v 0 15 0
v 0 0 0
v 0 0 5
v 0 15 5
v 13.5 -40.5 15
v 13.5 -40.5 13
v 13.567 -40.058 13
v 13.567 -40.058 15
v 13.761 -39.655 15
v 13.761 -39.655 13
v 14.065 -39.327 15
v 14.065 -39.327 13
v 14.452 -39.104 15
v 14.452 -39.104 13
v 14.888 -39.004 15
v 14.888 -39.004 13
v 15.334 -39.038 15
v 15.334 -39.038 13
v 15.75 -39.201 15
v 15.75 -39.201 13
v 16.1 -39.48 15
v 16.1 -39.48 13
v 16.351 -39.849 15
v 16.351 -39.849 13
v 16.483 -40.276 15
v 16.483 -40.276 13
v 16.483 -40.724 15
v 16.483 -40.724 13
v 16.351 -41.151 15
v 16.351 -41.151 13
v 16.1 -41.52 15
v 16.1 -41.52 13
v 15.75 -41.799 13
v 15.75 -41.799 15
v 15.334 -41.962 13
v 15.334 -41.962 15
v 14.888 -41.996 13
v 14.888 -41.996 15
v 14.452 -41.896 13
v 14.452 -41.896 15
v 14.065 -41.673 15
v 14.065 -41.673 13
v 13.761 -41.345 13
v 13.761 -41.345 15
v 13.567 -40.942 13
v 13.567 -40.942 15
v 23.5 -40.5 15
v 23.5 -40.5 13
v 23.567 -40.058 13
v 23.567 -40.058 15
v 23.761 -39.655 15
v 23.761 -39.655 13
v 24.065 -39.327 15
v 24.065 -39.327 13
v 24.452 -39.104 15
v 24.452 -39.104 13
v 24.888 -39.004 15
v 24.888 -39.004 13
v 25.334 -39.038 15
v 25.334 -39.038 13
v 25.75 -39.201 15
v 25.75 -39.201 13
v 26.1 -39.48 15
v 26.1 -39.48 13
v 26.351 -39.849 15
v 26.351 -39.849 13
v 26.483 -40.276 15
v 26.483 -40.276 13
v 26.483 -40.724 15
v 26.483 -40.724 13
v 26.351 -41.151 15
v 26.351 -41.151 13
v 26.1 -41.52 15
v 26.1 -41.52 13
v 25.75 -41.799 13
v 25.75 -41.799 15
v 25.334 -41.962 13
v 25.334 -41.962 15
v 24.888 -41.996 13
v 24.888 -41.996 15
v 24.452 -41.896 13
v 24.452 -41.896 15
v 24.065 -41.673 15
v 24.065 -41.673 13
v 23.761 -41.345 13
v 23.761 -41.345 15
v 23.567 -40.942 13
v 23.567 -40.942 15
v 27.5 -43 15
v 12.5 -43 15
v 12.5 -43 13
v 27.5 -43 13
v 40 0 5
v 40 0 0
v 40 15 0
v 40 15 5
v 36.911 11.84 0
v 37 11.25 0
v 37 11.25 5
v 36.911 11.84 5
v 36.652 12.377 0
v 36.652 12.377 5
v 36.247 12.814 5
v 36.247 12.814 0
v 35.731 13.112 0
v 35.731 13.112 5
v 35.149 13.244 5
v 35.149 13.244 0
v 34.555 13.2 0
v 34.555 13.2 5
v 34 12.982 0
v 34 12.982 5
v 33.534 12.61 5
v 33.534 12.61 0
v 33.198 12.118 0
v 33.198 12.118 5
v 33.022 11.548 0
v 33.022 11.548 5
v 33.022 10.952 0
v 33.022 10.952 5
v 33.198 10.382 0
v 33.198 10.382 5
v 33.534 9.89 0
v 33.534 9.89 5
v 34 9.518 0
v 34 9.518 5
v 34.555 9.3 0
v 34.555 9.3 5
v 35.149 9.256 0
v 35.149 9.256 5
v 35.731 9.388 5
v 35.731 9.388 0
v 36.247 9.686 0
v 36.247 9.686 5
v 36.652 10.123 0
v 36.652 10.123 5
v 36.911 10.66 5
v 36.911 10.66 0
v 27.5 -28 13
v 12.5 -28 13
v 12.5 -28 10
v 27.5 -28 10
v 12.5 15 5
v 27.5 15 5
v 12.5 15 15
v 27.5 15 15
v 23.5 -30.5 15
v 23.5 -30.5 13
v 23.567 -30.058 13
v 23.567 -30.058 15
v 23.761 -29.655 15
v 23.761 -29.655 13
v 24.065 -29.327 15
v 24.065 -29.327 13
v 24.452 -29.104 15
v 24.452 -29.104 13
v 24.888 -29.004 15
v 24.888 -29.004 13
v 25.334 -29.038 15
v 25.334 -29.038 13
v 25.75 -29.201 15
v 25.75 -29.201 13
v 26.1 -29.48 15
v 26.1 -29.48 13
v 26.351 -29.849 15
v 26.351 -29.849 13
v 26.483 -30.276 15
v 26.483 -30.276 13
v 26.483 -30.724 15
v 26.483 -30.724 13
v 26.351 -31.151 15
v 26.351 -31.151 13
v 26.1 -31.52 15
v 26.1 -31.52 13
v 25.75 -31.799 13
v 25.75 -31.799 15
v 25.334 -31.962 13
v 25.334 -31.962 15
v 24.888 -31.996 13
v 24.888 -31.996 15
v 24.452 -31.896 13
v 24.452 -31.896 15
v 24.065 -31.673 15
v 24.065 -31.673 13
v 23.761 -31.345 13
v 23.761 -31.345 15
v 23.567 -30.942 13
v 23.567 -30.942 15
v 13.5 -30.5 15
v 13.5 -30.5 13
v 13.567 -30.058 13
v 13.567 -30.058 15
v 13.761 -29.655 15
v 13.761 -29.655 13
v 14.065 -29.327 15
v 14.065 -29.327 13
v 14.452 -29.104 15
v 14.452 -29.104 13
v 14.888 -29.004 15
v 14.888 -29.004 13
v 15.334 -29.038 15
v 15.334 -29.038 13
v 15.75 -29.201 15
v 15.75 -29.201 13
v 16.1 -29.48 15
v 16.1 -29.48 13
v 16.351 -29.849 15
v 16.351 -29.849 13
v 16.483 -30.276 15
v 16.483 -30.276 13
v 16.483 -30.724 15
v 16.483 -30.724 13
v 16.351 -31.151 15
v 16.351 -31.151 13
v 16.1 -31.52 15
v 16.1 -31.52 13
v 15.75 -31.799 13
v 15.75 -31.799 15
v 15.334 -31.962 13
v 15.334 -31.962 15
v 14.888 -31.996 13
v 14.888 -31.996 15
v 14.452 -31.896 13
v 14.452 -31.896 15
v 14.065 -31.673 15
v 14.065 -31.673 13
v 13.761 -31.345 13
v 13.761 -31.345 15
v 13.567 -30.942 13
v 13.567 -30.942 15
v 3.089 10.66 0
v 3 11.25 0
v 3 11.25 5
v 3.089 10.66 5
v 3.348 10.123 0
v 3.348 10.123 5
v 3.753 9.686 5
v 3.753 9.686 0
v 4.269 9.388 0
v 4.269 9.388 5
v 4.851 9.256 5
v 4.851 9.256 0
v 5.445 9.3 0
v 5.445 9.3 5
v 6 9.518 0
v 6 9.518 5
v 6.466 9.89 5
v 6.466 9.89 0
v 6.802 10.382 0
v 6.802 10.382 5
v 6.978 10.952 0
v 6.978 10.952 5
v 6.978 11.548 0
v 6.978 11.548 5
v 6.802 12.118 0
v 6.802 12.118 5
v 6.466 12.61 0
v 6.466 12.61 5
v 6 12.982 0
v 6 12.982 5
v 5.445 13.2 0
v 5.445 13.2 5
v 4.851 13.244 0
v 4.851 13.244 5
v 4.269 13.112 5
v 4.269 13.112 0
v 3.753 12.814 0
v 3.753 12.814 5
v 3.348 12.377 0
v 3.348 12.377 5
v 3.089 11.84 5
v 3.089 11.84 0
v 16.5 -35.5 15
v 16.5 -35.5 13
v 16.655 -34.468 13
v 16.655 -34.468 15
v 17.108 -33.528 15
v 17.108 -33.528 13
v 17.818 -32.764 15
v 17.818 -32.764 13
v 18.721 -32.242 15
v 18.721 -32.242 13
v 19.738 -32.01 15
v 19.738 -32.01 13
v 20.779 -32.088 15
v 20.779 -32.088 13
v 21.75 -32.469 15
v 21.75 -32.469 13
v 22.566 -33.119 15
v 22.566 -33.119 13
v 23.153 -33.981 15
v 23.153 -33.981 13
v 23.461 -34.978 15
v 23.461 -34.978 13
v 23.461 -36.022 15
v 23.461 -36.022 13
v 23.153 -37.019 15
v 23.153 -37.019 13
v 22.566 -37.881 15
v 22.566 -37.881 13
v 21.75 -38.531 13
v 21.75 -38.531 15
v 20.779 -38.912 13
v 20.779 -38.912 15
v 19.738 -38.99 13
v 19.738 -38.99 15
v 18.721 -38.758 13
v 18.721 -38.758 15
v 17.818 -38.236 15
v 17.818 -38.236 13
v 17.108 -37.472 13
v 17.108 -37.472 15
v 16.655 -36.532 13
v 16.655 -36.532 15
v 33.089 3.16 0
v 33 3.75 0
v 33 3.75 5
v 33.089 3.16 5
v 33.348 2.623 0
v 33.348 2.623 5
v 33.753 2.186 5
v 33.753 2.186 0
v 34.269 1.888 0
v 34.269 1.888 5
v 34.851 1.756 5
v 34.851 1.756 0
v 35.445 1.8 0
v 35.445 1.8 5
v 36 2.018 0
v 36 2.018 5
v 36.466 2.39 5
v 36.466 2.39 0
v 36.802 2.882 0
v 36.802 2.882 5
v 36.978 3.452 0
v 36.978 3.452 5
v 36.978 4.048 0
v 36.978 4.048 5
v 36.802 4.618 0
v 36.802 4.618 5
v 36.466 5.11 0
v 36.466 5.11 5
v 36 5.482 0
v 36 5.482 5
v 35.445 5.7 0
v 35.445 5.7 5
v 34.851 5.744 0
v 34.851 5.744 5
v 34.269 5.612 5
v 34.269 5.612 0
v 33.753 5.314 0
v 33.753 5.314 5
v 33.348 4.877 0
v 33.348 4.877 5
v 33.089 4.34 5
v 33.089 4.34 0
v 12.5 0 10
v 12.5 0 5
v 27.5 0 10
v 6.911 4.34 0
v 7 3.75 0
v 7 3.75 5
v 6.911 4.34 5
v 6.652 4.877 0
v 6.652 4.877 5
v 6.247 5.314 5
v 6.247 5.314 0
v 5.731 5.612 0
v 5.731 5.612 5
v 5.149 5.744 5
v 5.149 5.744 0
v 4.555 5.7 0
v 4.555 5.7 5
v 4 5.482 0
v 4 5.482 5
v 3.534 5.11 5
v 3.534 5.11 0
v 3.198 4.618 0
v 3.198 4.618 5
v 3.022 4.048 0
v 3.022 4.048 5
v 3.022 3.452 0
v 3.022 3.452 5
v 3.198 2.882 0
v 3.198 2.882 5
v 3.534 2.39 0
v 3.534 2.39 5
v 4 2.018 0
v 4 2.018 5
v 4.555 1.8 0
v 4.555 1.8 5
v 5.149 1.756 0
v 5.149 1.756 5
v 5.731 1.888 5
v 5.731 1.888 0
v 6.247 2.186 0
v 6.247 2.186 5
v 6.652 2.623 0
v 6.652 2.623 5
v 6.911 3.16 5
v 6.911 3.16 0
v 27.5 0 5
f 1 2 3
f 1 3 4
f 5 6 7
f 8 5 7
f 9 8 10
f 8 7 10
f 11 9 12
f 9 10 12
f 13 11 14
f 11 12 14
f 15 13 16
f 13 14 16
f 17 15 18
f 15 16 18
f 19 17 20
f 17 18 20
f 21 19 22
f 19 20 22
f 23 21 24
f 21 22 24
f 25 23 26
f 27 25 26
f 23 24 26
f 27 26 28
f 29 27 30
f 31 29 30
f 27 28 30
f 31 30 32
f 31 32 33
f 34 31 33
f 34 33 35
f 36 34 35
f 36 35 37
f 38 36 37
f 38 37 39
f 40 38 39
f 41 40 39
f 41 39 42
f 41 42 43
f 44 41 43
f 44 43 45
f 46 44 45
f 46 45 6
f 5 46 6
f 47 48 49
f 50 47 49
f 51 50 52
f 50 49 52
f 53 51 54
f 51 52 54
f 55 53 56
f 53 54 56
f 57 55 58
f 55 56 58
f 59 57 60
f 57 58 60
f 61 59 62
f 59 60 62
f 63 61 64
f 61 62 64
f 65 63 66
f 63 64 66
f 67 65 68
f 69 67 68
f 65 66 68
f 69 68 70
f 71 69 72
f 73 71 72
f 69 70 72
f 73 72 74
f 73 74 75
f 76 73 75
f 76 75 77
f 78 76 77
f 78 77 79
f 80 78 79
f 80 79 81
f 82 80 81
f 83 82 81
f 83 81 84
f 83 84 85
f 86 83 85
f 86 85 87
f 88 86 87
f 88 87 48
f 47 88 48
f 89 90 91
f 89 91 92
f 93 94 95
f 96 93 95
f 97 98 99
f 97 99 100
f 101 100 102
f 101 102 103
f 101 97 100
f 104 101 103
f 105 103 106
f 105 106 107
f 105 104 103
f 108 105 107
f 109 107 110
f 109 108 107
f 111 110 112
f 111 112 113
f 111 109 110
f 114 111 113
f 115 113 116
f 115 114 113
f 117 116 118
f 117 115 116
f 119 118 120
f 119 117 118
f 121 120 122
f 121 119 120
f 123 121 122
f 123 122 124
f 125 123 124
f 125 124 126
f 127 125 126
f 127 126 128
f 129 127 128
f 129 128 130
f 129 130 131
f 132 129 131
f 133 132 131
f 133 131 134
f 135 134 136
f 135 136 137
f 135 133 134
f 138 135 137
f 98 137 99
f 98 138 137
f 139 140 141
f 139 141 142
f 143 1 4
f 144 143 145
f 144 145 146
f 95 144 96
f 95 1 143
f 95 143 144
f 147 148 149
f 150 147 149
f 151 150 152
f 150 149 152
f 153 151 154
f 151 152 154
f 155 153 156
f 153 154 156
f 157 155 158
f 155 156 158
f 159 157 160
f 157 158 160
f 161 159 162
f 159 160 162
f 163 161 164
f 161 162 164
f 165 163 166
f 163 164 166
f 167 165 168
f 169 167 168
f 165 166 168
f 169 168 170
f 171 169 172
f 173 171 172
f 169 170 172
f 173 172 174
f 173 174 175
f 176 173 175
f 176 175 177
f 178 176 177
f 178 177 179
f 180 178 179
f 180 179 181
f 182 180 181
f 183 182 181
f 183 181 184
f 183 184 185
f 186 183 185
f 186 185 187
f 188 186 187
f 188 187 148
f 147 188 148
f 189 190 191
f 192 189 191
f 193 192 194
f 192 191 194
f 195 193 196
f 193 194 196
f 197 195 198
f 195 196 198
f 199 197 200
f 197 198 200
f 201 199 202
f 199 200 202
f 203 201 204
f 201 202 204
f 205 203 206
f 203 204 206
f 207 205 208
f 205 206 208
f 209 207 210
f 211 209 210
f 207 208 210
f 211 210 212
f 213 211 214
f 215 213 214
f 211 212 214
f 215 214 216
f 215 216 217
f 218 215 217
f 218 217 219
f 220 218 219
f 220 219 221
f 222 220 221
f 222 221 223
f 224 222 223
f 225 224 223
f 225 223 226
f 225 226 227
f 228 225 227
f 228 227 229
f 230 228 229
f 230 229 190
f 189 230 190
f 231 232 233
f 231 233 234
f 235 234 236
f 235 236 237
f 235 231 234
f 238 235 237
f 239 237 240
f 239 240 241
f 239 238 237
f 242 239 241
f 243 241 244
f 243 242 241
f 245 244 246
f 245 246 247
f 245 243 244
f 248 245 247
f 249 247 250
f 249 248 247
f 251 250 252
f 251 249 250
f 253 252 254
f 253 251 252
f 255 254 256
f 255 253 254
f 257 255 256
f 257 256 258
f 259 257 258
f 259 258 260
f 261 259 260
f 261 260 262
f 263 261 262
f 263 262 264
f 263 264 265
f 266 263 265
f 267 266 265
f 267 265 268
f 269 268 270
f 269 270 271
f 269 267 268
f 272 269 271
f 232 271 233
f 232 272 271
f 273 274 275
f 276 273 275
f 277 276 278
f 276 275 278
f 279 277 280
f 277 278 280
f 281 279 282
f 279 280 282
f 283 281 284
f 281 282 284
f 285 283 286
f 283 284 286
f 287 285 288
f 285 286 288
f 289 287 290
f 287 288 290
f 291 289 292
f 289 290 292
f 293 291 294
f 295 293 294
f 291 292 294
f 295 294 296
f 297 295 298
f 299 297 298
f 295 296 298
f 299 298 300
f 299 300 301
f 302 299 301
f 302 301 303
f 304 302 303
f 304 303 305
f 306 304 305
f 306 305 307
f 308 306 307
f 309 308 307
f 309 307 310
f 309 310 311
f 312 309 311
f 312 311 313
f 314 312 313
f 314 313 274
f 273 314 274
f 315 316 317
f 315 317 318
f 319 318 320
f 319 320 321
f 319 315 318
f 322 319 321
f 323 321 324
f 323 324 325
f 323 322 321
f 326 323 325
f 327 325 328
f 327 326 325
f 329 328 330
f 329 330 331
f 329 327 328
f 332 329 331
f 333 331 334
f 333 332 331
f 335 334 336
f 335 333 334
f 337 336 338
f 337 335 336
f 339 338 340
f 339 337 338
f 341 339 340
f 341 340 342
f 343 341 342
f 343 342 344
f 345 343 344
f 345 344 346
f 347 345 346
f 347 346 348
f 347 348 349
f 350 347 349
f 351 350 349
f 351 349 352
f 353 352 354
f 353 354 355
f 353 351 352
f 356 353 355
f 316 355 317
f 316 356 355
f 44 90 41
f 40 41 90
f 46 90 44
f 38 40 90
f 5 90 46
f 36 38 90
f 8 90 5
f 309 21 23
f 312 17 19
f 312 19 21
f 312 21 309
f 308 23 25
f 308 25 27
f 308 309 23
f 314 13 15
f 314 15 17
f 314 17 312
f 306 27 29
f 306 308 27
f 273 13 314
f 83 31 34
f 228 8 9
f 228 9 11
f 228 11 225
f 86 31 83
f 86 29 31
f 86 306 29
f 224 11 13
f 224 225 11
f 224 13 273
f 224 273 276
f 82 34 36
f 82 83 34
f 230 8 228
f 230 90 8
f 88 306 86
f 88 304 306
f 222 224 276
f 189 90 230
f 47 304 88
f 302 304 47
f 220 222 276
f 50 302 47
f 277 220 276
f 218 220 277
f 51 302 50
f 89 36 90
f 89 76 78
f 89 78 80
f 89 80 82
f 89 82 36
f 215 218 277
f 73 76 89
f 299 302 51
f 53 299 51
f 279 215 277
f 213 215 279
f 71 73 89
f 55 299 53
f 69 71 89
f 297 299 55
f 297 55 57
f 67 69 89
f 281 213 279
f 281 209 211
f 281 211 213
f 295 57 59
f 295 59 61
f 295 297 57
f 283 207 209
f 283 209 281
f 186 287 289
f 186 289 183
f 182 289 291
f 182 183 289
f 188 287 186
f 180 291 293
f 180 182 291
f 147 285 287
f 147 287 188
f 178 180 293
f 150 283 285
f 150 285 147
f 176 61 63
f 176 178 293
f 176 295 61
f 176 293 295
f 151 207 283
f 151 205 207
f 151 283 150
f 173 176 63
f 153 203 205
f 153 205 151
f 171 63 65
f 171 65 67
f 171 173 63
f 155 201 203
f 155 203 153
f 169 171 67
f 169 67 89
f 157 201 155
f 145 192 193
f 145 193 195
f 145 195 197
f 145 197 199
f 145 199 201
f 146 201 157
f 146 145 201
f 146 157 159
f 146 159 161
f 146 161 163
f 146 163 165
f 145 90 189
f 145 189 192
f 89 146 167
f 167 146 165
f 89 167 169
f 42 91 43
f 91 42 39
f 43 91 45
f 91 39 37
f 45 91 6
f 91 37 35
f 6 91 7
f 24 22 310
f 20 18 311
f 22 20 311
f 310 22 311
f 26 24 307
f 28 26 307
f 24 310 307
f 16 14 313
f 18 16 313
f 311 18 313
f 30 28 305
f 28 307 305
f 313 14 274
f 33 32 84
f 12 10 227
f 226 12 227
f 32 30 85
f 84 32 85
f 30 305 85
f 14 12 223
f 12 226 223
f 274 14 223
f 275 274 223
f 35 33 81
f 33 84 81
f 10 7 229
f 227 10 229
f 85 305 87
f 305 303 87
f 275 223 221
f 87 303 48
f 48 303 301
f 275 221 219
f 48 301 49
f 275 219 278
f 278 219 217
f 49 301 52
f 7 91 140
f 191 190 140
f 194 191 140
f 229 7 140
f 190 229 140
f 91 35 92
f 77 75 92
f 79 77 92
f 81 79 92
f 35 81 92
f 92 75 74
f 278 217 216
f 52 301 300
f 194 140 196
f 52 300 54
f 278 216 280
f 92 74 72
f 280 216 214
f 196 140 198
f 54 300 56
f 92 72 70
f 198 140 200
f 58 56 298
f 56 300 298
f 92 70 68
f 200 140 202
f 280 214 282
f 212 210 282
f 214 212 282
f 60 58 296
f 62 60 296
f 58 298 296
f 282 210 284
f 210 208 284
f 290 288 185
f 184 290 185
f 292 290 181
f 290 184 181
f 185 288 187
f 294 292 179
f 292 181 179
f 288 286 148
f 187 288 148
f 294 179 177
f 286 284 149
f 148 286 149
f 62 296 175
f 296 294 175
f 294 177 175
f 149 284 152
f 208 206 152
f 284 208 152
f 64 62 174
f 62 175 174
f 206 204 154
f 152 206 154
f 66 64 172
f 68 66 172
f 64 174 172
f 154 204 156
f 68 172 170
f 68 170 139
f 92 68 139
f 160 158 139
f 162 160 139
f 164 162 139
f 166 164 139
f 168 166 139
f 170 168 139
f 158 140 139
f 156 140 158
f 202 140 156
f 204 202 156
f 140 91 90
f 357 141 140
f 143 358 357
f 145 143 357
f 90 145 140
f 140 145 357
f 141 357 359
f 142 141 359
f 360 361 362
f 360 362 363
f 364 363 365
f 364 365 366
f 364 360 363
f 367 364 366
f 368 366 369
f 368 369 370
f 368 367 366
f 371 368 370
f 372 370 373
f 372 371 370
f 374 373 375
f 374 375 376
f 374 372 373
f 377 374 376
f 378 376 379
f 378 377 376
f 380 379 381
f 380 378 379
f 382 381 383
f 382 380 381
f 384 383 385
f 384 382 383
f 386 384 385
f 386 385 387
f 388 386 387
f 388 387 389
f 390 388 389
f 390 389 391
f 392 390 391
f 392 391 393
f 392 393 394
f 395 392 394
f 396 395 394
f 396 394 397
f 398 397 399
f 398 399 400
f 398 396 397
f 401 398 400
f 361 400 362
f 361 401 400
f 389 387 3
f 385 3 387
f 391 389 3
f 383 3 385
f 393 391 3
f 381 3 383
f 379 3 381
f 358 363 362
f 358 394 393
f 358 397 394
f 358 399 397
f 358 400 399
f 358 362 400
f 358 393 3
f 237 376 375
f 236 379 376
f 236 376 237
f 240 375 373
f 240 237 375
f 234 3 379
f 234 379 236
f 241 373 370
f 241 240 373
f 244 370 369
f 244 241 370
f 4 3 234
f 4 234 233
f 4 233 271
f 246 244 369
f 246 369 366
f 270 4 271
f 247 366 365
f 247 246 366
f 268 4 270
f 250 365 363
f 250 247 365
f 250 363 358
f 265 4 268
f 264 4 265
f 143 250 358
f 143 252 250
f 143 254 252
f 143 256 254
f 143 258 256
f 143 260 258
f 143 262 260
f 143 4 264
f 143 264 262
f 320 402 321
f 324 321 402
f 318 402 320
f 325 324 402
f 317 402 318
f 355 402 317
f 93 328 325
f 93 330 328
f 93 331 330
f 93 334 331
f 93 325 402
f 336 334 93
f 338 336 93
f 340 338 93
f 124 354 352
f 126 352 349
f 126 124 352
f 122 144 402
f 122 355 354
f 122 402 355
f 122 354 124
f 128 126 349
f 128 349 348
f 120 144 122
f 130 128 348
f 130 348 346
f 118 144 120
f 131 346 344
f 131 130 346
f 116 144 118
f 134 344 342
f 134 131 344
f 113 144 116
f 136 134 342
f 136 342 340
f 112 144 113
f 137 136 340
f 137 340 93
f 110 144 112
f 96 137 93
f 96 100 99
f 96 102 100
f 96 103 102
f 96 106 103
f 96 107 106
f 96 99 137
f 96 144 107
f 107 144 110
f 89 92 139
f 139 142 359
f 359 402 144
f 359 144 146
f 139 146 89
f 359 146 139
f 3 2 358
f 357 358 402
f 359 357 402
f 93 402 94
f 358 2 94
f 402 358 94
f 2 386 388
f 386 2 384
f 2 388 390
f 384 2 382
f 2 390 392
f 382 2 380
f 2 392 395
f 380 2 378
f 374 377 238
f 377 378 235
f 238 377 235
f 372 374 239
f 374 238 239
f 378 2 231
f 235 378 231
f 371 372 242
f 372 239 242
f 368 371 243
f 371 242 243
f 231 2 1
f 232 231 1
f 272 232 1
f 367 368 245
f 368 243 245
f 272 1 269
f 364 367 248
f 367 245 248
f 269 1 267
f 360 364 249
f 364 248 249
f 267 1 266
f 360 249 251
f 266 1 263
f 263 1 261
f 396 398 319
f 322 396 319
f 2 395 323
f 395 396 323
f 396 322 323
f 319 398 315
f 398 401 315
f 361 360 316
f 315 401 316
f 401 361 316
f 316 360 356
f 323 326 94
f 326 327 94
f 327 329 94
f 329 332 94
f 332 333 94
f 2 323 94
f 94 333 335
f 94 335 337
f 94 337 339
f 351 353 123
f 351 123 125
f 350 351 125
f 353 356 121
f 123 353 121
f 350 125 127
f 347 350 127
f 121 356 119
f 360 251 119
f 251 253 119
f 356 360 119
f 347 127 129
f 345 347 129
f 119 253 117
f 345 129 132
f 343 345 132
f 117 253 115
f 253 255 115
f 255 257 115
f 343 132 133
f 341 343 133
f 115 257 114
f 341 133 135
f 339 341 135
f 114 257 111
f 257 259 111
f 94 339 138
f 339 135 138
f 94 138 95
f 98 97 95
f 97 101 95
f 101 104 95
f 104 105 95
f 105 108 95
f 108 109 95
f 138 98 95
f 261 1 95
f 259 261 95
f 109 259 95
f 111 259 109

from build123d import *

# Parameters (mm, degrees)
SKETCH2_W           = 40
SKETCH2_H           = 15
SKETCH2_R           = 2
BOSS_EXTRUDE1_DEPTH = 5
SKETCH3_W           = 15
SKETCH3_H           = 15
BOSS_EXTRUDE2_DEPTH = 10
SKETCH4_W           = 15
SKETCH4_H           = 5
BOSS_EXTRUDE3_DEPTH = 28
SKETCH5_W           = 15
SKETCH5_H           = 2
BOSS_EXTRUDE4_DEPTH = 15
SKETCH6_R           = 1.5
SKETCH6_R_2         = 3.5
CUT_EXTRUDE1_DEPTH  = 15


with BuildPart() as part:
    # Sketch2 → Boss-Extrude1 (new body)
    with BuildSketch(Plane.XY):
        with Locations((20, 7.5)):
            Rectangle(SKETCH2_W, SKETCH2_H)
        with Locations((5, 3.75)):
            Circle(SKETCH2_R, mode=Mode.SUBTRACT)
        with Locations(Location((5, 11.25, 0), (0, 0, 180))):
            Circle(SKETCH2_R, mode=Mode.SUBTRACT)
        with Locations(Location((35, 3.75, 0), (0, 0, 180))):
            Circle(SKETCH2_R, mode=Mode.SUBTRACT)
        with Locations((35, 11.25)):
            Circle(SKETCH2_R, mode=Mode.SUBTRACT)
    extrude(amount=BOSS_EXTRUDE1_DEPTH)

    # Sketch3 → Boss-Extrude2 (add)
    with BuildSketch(Plane.XY.offset(5)):
        with Locations((20, 7.5)):
            Rectangle(SKETCH3_W, SKETCH3_H)
    extrude(amount=BOSS_EXTRUDE2_DEPTH)

    # Sketch4 → Boss-Extrude3 (add)
    with BuildSketch(Plane.XZ):
        with Locations((20, 12.5)):
            Rectangle(SKETCH4_W, SKETCH4_H)
    extrude(amount=BOSS_EXTRUDE3_DEPTH)

    # Sketch5 → Boss-Extrude4 (add)
    with BuildSketch(Plane.XZ.offset(28)):
        with Locations((20, 14)):
            Rectangle(SKETCH5_W, SKETCH5_H)
    extrude(amount=BOSS_EXTRUDE4_DEPTH)

    # Sketch6 → Cut-Extrude1 (cut)
    with BuildSketch(Plane(origin=(0, 0, 13), x_dir=(-1, 0, 0), z_dir=(0, 0, -1))):
        with Locations((-15, -30.5)):
            Circle(SKETCH6_R)
        with Locations((-25, -30.5)):
            Circle(SKETCH6_R)
        with Locations((-20, -35.5)):
            Circle(SKETCH6_R_2)
        with Locations((-15, -40.5)):
            Circle(SKETCH6_R)
        with Locations((-25, -40.5)):
            Circle(SKETCH6_R)
    extrude(amount=-CUT_EXTRUDE1_DEPTH, mode=Mode.SUBTRACT)


solid = part.part
